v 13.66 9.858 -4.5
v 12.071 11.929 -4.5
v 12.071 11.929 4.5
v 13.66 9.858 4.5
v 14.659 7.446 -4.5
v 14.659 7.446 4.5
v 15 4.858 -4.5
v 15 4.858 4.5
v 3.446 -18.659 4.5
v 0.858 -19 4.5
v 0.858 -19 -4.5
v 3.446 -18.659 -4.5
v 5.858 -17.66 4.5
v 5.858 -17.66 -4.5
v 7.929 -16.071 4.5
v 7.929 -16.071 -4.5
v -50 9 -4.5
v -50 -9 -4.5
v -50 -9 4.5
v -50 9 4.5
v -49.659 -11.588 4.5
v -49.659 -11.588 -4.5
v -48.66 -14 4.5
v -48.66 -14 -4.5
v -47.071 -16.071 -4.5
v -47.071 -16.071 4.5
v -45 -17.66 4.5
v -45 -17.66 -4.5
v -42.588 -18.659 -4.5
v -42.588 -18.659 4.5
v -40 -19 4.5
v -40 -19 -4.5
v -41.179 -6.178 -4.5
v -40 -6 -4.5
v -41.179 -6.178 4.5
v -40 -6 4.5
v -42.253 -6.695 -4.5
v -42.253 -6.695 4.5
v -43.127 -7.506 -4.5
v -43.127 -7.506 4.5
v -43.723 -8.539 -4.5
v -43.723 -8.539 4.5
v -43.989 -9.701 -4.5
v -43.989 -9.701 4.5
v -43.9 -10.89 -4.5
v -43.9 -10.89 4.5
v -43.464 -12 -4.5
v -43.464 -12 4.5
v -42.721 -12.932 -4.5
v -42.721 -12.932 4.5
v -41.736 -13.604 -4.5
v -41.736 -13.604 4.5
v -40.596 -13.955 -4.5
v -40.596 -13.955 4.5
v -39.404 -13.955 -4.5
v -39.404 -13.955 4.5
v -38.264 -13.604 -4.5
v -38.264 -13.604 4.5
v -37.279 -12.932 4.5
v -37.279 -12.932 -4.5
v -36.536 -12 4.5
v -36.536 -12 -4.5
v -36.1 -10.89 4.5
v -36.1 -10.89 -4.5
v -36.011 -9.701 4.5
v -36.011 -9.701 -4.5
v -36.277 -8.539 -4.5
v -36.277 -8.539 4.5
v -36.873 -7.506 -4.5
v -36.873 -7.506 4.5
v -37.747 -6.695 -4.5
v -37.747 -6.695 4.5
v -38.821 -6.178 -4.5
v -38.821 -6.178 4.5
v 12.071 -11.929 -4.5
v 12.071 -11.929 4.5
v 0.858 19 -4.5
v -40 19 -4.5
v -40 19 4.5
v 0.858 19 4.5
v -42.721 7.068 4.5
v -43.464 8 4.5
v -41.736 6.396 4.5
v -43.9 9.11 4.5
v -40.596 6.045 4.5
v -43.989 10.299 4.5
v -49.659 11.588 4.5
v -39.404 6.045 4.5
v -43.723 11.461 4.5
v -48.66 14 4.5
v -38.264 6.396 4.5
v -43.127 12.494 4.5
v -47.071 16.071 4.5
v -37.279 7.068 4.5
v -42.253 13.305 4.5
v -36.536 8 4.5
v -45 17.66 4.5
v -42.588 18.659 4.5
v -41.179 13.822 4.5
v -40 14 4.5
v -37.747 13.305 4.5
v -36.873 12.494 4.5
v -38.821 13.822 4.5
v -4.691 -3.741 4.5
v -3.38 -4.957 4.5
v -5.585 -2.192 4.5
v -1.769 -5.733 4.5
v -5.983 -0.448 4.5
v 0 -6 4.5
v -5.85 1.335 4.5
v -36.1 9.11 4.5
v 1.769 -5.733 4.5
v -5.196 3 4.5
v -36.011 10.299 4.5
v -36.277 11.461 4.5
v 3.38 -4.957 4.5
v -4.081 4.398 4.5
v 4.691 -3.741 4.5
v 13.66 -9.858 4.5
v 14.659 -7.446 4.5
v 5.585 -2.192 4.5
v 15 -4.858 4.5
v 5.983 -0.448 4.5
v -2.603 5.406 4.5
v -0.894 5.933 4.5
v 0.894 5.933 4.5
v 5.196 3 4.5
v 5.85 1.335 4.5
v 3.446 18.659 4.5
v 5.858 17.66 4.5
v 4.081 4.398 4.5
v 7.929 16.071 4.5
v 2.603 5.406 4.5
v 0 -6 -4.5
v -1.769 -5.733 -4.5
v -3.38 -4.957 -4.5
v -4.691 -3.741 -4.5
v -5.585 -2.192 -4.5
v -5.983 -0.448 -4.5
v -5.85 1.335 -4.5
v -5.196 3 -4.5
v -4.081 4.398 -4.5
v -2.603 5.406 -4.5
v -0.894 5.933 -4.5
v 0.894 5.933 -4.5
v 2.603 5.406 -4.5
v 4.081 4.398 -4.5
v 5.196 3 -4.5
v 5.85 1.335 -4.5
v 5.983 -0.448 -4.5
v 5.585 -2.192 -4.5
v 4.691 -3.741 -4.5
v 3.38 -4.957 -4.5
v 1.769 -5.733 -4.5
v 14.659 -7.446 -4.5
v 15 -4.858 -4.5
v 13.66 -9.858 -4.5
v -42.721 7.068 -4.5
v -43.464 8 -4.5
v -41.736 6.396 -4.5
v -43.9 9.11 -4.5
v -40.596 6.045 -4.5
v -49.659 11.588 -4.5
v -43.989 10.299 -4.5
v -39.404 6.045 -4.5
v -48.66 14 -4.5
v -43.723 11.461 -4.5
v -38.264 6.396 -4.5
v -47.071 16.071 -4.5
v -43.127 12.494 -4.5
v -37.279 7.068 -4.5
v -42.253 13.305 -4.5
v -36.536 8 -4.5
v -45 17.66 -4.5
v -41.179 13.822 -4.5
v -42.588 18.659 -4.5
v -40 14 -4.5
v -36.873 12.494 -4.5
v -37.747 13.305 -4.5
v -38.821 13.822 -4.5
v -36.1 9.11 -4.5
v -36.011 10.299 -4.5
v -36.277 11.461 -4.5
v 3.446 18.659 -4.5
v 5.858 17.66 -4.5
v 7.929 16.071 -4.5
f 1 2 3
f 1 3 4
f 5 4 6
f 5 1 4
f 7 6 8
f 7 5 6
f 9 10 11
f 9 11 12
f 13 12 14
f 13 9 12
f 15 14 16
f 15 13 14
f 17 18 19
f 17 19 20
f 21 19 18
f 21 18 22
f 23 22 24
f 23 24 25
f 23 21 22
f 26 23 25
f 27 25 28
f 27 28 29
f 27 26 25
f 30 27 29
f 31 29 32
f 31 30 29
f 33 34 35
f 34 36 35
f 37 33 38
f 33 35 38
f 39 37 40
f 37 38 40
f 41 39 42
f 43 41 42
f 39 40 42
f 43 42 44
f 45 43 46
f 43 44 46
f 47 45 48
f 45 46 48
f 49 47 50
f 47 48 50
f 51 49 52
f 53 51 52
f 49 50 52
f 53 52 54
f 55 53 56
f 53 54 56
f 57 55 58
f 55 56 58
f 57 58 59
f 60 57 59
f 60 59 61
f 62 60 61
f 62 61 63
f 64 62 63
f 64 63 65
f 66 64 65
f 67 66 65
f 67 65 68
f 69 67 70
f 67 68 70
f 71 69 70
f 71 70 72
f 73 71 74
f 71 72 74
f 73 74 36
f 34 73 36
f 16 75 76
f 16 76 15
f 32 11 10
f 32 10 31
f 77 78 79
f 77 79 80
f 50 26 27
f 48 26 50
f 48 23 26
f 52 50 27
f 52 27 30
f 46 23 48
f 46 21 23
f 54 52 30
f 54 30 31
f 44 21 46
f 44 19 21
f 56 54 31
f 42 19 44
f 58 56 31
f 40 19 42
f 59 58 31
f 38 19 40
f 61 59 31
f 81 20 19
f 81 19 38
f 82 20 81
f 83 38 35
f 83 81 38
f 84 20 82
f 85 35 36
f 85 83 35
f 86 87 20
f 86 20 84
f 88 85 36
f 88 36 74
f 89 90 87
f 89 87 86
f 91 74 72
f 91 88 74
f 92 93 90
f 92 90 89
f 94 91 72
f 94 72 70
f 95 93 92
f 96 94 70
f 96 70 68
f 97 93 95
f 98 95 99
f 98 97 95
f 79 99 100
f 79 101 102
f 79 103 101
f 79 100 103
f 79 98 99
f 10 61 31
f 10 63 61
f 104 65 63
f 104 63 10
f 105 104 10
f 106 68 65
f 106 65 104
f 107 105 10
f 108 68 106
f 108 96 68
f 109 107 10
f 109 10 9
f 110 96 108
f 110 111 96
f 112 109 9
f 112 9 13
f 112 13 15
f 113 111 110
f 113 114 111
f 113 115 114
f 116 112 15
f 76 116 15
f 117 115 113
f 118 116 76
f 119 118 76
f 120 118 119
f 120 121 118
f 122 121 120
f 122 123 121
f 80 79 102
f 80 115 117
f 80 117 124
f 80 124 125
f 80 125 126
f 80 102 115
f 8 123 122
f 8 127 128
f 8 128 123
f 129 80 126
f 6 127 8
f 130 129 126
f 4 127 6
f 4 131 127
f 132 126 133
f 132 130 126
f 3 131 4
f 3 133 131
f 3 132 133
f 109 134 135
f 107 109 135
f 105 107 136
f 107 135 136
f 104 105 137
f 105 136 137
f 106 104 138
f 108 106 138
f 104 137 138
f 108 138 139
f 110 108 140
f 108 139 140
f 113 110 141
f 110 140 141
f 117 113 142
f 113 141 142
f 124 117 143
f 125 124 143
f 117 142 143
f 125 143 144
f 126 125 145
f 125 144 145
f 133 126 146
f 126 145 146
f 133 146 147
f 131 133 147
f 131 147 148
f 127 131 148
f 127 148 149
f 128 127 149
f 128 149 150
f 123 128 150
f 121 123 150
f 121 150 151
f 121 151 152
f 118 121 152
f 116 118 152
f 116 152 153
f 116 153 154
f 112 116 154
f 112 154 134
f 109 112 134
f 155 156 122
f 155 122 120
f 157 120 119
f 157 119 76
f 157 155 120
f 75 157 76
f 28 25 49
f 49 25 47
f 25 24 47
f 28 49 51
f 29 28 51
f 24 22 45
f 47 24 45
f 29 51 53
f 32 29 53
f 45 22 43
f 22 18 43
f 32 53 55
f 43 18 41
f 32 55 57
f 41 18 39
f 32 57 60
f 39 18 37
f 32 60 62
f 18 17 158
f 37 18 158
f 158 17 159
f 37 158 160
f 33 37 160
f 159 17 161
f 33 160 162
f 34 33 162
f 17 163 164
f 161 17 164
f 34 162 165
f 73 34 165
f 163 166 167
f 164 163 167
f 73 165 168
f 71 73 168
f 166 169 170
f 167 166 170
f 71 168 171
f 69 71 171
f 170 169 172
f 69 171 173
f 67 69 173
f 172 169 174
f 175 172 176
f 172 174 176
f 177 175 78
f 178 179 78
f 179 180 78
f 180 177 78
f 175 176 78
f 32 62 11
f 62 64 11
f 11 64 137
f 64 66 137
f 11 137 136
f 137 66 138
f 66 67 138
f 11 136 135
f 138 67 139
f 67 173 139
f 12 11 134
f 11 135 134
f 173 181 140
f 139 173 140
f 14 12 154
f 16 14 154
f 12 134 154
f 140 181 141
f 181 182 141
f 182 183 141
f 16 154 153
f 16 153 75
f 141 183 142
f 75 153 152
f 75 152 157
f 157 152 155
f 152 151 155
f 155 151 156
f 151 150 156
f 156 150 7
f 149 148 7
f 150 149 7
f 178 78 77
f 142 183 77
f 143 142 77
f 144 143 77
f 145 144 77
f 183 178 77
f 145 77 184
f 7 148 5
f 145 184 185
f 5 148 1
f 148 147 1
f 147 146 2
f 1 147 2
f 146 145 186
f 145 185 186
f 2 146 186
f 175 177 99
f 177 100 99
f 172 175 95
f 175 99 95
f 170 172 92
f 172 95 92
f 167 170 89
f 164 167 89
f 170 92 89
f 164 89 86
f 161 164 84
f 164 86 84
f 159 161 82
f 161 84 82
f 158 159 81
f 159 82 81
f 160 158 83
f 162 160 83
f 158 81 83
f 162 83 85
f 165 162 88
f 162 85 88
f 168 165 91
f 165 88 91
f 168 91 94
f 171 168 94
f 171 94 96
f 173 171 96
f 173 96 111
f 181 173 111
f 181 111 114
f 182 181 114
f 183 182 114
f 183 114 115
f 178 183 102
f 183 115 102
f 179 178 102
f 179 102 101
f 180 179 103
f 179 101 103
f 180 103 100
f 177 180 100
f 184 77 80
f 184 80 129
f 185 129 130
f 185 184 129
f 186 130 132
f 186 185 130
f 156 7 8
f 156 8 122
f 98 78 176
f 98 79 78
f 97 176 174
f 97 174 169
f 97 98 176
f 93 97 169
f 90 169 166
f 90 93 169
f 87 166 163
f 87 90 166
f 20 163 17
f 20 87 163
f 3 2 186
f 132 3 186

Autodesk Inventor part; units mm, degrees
ref_plane "YZ Plane" through (0, 0, 0) normal (1, 0, 0) x (0, 1, 0)
ref_plane "XZ Plane" through (0, 0, 0) normal (0, 1, 0) x (-1, 0, 0)
ref_plane "XY Plane" through (0, 0, 0) normal (0, 0, 1) x (1, 0, 0)
sketch "スケッチ2" plane through (0, 0, 0) normal (0, 0, 1) x (1, 0, 0)
  line L0 (-50, 19) -> (5, 19)
  line L1 (15, 9) -> (15, -9)
  line L2 (5, -19) -> (-50, -19)
  line L3 (-50, -19) -> (-50, 19)
  line L4 (15, 9) -> (5, 19)
  line L5 (15, -9) -> (5, -19)
  point P0 (15, -19)
  point P1 (15, 19)
  point P2 (0, 0)
  dimension "d2" = 10
  dimension "d3" = 10
  dimension "d4" = 10
  dimension "d5" = 10
  dimension "d6" = 38
  dimension "d7" = 65
  dimension "d34" = 19
  dimension "d36" = 50
extrude "押し出し2" add sketch "スケッチ2" along normal mid plane 9
sketch "スケッチ4" plane through (0, 0, -4.5) normal (0, 0, -1) x (-1, 0, 0)
  line L0 (50, 19) -> (50, -19) projected
  line L1 (50, -19) -> (-5, -19) projected
  point P0 (40, -10)
  point P1 (40, 10)
  dimension "d24" = 10
  dimension "d25" = 9
  dimension "d26" = 20
hole "穴2" at (-40, -10, -4.5) at (-40, 10, -4.5) direction (0, 0, 1) diameter 8 end through all
sketch "スケッチ5" plane through (0, 0, 4.5) normal (0, 0, 1) x (1, 0, 0)
  point P0 (0, 0)
  point P1 (0, 0)
hole "穴3" at (0, 0, 4.5) direction (0, 0, -1) diameter 12 end through all
fillet "Fillet1" radius 10 6 edges at (-50, 19, 0) (-50, -19, 0) (5, -19, 0) (15, -9, 0) (15, 9, 0) (5, 19, 0)
equation "\"d3\" = d2"
equation "\"d4\" = d2"
equation "\"d5\" = d4"
equation "\"d34\" = 0.5 * d6"
properties part number "210-106c" material "STEEL - HIGH GRADE ALLOY"
